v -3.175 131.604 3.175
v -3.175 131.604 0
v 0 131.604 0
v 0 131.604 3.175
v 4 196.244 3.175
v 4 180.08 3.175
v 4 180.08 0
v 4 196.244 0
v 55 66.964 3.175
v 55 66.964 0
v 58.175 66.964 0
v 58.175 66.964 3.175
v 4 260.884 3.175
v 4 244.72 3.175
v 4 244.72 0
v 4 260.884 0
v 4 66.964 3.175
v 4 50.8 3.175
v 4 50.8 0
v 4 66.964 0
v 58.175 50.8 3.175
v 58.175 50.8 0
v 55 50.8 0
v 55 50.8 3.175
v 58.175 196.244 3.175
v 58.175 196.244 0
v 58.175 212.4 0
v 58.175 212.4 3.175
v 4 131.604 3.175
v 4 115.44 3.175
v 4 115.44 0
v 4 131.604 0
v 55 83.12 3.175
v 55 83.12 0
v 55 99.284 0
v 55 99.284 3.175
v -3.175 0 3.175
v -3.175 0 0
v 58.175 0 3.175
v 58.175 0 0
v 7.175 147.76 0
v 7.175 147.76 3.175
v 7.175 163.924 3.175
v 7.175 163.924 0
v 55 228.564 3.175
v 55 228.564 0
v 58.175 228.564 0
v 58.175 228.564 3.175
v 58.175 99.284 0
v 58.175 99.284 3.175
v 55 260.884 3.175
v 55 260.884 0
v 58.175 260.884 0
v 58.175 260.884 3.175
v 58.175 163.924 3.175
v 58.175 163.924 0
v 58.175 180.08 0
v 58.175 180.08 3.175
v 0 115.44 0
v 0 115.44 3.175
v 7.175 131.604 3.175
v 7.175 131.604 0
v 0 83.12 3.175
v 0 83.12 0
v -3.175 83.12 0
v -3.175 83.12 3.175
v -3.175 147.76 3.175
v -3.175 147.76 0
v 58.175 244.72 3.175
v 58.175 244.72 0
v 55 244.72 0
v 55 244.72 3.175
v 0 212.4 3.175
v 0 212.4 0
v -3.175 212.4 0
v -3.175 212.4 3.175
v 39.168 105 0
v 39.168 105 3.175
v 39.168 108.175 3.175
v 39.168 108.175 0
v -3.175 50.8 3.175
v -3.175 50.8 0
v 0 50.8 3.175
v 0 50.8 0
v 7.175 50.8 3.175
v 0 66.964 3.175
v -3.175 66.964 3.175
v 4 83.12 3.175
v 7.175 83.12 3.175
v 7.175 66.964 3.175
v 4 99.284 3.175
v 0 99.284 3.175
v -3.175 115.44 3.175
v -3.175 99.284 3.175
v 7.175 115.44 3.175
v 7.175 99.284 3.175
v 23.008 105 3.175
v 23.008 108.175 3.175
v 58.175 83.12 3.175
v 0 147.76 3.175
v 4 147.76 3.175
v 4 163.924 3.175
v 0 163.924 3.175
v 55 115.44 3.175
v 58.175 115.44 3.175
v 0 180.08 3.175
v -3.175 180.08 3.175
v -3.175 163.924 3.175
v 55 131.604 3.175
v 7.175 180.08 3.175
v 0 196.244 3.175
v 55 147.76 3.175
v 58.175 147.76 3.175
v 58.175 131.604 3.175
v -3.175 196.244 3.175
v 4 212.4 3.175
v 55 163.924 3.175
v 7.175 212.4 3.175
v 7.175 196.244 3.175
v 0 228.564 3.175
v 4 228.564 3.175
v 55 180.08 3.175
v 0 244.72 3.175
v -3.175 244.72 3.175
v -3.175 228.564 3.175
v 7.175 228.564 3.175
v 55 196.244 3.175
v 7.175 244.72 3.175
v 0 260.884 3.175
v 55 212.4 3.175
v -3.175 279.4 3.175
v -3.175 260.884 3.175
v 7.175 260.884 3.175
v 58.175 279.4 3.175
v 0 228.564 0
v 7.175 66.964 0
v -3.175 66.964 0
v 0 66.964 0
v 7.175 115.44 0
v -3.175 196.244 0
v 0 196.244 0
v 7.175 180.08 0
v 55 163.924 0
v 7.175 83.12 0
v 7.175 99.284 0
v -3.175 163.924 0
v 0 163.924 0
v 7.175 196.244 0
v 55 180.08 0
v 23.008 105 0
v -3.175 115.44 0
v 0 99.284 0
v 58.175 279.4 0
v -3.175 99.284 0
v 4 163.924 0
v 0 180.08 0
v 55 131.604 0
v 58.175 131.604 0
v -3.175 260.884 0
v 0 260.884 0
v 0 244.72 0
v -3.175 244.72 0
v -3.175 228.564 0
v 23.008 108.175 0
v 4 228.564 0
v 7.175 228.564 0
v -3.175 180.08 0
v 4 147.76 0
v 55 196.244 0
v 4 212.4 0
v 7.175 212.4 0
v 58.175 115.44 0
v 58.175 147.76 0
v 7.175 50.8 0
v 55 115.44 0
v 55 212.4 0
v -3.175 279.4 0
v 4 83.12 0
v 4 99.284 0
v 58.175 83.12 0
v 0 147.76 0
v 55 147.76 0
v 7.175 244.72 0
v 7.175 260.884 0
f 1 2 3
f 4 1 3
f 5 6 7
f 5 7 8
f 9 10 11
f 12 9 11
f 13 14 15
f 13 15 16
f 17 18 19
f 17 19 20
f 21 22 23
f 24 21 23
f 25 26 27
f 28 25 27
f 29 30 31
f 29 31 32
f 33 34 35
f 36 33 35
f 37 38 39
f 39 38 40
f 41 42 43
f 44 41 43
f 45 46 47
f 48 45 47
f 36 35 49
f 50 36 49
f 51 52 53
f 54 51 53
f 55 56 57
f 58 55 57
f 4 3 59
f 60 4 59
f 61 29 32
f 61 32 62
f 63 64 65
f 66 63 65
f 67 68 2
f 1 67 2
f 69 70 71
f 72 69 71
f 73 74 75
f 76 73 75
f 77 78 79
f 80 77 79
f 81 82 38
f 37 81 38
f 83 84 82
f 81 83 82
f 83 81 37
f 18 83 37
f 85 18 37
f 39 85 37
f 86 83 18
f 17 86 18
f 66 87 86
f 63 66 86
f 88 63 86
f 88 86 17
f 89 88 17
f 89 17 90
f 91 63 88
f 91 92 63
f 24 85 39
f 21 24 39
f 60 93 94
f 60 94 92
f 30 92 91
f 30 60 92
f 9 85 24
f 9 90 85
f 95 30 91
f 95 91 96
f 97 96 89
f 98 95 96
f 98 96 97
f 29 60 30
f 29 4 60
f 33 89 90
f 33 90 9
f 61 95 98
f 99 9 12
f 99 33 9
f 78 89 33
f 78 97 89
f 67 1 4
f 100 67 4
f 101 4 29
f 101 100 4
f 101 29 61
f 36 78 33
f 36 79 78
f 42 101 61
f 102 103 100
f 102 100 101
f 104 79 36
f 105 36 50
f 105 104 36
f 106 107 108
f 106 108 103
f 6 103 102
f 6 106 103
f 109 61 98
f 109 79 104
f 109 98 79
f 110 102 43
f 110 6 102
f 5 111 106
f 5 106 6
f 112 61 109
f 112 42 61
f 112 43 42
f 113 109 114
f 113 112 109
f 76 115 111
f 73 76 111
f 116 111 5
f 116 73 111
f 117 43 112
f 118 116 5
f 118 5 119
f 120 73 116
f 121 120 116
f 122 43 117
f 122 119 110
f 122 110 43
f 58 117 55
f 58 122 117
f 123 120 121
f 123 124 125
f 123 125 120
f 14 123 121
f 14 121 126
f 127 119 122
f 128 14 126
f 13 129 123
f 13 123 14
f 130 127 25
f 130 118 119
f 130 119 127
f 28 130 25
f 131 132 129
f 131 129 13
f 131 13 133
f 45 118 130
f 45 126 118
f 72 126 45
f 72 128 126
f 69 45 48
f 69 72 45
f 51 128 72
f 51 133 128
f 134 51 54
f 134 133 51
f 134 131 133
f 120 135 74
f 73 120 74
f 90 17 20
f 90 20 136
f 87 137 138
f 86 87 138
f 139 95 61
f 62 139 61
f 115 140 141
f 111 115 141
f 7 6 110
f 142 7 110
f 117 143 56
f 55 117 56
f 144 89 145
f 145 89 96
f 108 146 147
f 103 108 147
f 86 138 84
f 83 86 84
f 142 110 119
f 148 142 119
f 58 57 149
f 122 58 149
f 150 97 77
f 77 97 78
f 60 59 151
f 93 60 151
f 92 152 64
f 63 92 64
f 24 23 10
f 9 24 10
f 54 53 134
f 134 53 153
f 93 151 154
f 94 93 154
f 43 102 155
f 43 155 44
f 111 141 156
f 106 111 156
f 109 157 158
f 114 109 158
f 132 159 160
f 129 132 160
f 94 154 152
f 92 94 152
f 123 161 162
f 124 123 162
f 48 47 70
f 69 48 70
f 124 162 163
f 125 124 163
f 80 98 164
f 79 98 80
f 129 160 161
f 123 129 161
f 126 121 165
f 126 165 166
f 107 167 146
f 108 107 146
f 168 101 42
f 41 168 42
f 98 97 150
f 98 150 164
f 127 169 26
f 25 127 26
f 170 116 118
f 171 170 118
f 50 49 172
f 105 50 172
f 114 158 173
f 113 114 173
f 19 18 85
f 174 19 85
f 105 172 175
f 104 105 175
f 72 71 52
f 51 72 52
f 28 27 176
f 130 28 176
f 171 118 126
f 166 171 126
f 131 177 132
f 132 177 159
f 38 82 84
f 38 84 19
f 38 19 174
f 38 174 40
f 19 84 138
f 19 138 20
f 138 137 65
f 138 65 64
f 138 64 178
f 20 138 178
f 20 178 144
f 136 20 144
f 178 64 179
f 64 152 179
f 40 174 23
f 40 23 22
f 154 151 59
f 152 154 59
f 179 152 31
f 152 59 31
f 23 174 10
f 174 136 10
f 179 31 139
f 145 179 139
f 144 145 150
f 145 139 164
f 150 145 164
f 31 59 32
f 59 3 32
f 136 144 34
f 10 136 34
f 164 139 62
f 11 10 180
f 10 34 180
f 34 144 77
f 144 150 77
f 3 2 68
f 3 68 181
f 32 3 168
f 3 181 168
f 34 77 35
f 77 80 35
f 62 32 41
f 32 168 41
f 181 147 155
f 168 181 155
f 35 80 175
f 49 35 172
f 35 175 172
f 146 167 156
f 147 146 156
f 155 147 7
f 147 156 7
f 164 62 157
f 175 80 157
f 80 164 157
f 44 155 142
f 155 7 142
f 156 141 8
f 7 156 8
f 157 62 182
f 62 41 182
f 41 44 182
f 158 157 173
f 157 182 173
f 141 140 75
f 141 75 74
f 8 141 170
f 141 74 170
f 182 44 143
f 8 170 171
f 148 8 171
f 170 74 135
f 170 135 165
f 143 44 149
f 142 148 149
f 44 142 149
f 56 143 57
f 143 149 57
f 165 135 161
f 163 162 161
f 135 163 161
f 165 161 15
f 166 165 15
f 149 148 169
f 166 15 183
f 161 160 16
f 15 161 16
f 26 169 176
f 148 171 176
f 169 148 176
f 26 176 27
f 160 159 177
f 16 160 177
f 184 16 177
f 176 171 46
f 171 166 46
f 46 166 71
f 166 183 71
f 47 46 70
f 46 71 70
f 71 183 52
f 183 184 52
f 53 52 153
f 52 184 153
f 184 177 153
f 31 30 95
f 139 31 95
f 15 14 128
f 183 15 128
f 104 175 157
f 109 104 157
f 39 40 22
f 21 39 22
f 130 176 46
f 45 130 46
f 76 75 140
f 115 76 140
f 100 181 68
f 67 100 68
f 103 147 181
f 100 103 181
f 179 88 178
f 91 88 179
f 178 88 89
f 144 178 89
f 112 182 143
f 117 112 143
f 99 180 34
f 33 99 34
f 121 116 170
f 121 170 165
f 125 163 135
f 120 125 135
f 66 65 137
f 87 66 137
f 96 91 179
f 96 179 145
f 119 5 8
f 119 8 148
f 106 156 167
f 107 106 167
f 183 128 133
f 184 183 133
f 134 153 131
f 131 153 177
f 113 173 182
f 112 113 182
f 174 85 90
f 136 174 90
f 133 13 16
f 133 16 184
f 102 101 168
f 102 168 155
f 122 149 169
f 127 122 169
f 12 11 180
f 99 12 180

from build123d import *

# Parameters (mm, degrees)
BOSS_EXTRUDE1_DEPTH = 3.175
SKETCH3_W           = 3.175
SKETCH3_H           = 16.163636364
CUT_EXTRUDE2_DEPTH  = 10
SKETCH4_W           = 16.16
SKETCH4_H           = 3.175
CUT_EXTRUDE3_DEPTH  = 10


with BuildPart() as part:
    # Sketch1 → Boss-Extrude1 (new body)
    with BuildSketch(Plane.XY):
        Polygon((0, 50.8), (-3.175, 50.8), (-3.175, 0), (58.175, 0), (58.175, 50.8), (55, 50.8), (55, 66.963636364), (58.175, 66.963636364), (58.175, 83.12), (55, 83.12), (55, 99.283636364), (58.175, 99.283636364), (58.175, 115.44), (55, 115.44), (55, 131.603636364), (58.175, 131.603636364), (58.175, 147.76), (55, 147.76), (55, 163.923636364), (58.175, 163.923636364), (58.175, 180.08), (55, 180.08), (55, 196.243636364), (58.175, 196.243636364), (58.175, 212.4), (55, 212.4), (55, 228.563636364), (58.175, 228.563636364), (58.175, 244.72), (55, 244.72), (55, 260.883636364), (58.175, 260.883636364), (58.175, 279.4), (-3.175, 279.4), (-3.175, 260.883636364), (0, 260.883636364), (0, 244.72), (-3.175, 244.72), (-3.175, 228.563636364), (0, 228.563636364), (0, 212.4), (-3.175, 212.4), (-3.175, 196.243636364), (0, 196.243636364), (0, 180.109090909), (0, 180.08), (-3.175, 180.08), (-3.175, 163.923636364), (0, 163.923636364), (0, 147.76), (-3.175, 147.76), (-3.175, 131.603636364), (0, 131.603636364), (0, 115.44), (-3.175, 115.44), (-3.175, 99.283636364), (0, 99.283636364), (0, 83.12), (-3.175, 83.12), (-3.175, 66.963636364), (0, 66.963636364), align=None)
    extrude(amount=BOSS_EXTRUDE1_DEPTH)

    # Sketch3 → Cut-Extrude2 (cut)
    with BuildSketch(Plane.XY.offset(3.175)):
        with Locations((5.5875, 58.881818182)):
            Rectangle(SKETCH3_W, SKETCH3_H)
        with Locations((5.5875, 91.201818182)):
            Rectangle(SKETCH3_W, SKETCH3_H)
        with Locations((5.5875, 123.521818182)):
            Rectangle(SKETCH3_W, SKETCH3_H)
        with Locations((5.5875, 155.841818182)):
            Rectangle(SKETCH3_W, SKETCH3_H)
        with Locations((5.5875, 188.161818182)):
            Rectangle(SKETCH3_W, SKETCH3_H)
        with Locations((5.5875, 220.481818182)):
            Rectangle(SKETCH3_W, SKETCH3_H)
        with Locations((5.5875, 252.801818182)):
            Rectangle(SKETCH3_W, SKETCH3_H)
    extrude(amount=-CUT_EXTRUDE2_DEPTH, mode=Mode.SUBTRACT)

    # Sketch4 → Cut-Extrude3 (cut)
    with BuildSketch(Plane.XY.offset(3.175)):
        with Locations((31.0875, 106.5875)):
            Rectangle(SKETCH4_W, SKETCH4_H)
    extrude(amount=-CUT_EXTRUDE3_DEPTH, mode=Mode.SUBTRACT)


solid = part.part
